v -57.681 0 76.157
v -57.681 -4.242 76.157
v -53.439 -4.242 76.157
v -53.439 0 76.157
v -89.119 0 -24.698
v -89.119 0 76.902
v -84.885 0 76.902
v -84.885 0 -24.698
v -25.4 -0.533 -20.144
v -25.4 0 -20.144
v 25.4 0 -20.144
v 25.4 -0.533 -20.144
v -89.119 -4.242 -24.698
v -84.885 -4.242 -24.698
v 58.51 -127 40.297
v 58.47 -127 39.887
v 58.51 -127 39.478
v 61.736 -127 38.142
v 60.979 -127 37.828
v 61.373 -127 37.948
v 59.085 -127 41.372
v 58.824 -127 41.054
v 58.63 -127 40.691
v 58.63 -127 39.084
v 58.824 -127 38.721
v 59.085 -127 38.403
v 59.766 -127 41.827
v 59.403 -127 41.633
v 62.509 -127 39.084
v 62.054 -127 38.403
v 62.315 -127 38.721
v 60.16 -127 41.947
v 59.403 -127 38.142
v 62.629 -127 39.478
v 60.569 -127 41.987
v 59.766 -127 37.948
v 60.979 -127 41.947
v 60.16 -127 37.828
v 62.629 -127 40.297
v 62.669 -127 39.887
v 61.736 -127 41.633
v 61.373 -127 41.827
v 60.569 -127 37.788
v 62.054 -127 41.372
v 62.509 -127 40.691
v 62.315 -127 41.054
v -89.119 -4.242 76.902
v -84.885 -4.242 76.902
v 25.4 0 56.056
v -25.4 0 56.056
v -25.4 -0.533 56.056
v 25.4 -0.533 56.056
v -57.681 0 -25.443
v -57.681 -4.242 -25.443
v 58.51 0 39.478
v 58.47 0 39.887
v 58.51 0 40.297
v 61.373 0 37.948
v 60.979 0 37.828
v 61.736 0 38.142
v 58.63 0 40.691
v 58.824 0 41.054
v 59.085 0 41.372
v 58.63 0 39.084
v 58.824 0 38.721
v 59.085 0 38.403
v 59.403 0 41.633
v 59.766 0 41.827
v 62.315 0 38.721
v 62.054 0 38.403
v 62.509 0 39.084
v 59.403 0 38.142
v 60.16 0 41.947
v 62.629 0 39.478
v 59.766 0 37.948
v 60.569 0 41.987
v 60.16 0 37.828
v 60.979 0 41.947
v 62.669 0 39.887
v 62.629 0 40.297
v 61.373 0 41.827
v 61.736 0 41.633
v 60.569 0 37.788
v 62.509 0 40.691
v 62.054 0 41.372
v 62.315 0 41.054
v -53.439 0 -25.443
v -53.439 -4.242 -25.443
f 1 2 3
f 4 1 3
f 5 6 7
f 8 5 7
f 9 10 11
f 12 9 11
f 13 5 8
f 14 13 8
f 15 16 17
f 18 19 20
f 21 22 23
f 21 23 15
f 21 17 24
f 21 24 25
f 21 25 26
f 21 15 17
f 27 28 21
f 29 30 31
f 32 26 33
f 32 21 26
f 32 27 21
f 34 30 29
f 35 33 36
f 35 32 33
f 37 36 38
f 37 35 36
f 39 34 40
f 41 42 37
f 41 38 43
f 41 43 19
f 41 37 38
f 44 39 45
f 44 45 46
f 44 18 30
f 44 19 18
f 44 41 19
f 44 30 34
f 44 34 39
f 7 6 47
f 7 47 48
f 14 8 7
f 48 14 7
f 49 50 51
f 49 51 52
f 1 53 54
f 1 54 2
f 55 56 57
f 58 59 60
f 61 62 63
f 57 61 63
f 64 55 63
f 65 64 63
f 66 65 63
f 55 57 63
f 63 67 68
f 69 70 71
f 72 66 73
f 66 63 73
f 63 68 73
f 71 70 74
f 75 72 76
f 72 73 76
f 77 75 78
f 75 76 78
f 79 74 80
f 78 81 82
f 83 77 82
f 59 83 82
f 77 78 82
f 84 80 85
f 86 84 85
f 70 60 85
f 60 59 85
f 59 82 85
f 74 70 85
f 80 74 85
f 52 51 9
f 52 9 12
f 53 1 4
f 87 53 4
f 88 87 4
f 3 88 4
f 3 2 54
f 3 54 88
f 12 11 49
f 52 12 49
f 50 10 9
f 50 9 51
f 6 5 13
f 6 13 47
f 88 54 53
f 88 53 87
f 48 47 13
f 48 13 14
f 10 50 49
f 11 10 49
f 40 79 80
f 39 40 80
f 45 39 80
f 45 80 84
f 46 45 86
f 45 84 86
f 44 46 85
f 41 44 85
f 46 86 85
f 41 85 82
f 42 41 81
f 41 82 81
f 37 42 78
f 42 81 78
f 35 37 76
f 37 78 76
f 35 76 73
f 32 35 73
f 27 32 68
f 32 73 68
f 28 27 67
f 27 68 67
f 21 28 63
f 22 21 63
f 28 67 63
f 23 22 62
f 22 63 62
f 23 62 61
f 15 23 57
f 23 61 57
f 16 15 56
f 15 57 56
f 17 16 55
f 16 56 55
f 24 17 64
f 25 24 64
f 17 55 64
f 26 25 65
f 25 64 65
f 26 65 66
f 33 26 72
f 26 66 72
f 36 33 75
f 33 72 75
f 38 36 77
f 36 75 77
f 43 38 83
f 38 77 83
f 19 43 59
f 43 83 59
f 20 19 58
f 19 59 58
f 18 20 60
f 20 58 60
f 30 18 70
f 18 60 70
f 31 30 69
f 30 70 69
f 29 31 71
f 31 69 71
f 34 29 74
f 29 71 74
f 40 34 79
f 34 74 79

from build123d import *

# Parameters (mm, degrees)
F0_W     = 4.233334
F0_H     = 101.6
F1_DEPTH = 4.2418
F0_W_2   = 50.8
F0_H_2   = 76.2
F2_DEPTH = 0.5334
F3_R     = 2.099698
F4_DEPTH = 127
F0_W_3   = 4.2418
F5_DEPTH = 4.2418


with BuildPart() as f1:
    # F0 (on Front) → F1 (new body)
    with BuildSketch(Plane.XZ):
        with Locations((-87.001896, 26.101648)):
            Rectangle(F0_W, F0_H)
    extrude(amount=F1_DEPTH)


with BuildPart() as f2:
    # F0 (on Front) → F2 (new body)
    with BuildSketch(Plane.XZ):
        with Locations((0, 17.956149)):
            Rectangle(F0_W_2, F0_H_2)
    extrude(amount=F2_DEPTH)


with BuildPart() as f4:
    # F3 (on Front) → F4 (new body)
    with BuildSketch(Plane.XZ):
        with Locations((60.569402, 39.887477)):
            Circle(F3_R)
    extrude(amount=F4_DEPTH)


with BuildPart() as f5:
    # F0 (on Front) → F5 (new body)
    with BuildSketch(Plane.XZ):
        with Locations((-55.560307, 25.357223)):
            Rectangle(F0_W_3, F0_H)
    extrude(amount=F5_DEPTH)


solid = Compound([f1.part, f2.part, f4.part, f5.part])
